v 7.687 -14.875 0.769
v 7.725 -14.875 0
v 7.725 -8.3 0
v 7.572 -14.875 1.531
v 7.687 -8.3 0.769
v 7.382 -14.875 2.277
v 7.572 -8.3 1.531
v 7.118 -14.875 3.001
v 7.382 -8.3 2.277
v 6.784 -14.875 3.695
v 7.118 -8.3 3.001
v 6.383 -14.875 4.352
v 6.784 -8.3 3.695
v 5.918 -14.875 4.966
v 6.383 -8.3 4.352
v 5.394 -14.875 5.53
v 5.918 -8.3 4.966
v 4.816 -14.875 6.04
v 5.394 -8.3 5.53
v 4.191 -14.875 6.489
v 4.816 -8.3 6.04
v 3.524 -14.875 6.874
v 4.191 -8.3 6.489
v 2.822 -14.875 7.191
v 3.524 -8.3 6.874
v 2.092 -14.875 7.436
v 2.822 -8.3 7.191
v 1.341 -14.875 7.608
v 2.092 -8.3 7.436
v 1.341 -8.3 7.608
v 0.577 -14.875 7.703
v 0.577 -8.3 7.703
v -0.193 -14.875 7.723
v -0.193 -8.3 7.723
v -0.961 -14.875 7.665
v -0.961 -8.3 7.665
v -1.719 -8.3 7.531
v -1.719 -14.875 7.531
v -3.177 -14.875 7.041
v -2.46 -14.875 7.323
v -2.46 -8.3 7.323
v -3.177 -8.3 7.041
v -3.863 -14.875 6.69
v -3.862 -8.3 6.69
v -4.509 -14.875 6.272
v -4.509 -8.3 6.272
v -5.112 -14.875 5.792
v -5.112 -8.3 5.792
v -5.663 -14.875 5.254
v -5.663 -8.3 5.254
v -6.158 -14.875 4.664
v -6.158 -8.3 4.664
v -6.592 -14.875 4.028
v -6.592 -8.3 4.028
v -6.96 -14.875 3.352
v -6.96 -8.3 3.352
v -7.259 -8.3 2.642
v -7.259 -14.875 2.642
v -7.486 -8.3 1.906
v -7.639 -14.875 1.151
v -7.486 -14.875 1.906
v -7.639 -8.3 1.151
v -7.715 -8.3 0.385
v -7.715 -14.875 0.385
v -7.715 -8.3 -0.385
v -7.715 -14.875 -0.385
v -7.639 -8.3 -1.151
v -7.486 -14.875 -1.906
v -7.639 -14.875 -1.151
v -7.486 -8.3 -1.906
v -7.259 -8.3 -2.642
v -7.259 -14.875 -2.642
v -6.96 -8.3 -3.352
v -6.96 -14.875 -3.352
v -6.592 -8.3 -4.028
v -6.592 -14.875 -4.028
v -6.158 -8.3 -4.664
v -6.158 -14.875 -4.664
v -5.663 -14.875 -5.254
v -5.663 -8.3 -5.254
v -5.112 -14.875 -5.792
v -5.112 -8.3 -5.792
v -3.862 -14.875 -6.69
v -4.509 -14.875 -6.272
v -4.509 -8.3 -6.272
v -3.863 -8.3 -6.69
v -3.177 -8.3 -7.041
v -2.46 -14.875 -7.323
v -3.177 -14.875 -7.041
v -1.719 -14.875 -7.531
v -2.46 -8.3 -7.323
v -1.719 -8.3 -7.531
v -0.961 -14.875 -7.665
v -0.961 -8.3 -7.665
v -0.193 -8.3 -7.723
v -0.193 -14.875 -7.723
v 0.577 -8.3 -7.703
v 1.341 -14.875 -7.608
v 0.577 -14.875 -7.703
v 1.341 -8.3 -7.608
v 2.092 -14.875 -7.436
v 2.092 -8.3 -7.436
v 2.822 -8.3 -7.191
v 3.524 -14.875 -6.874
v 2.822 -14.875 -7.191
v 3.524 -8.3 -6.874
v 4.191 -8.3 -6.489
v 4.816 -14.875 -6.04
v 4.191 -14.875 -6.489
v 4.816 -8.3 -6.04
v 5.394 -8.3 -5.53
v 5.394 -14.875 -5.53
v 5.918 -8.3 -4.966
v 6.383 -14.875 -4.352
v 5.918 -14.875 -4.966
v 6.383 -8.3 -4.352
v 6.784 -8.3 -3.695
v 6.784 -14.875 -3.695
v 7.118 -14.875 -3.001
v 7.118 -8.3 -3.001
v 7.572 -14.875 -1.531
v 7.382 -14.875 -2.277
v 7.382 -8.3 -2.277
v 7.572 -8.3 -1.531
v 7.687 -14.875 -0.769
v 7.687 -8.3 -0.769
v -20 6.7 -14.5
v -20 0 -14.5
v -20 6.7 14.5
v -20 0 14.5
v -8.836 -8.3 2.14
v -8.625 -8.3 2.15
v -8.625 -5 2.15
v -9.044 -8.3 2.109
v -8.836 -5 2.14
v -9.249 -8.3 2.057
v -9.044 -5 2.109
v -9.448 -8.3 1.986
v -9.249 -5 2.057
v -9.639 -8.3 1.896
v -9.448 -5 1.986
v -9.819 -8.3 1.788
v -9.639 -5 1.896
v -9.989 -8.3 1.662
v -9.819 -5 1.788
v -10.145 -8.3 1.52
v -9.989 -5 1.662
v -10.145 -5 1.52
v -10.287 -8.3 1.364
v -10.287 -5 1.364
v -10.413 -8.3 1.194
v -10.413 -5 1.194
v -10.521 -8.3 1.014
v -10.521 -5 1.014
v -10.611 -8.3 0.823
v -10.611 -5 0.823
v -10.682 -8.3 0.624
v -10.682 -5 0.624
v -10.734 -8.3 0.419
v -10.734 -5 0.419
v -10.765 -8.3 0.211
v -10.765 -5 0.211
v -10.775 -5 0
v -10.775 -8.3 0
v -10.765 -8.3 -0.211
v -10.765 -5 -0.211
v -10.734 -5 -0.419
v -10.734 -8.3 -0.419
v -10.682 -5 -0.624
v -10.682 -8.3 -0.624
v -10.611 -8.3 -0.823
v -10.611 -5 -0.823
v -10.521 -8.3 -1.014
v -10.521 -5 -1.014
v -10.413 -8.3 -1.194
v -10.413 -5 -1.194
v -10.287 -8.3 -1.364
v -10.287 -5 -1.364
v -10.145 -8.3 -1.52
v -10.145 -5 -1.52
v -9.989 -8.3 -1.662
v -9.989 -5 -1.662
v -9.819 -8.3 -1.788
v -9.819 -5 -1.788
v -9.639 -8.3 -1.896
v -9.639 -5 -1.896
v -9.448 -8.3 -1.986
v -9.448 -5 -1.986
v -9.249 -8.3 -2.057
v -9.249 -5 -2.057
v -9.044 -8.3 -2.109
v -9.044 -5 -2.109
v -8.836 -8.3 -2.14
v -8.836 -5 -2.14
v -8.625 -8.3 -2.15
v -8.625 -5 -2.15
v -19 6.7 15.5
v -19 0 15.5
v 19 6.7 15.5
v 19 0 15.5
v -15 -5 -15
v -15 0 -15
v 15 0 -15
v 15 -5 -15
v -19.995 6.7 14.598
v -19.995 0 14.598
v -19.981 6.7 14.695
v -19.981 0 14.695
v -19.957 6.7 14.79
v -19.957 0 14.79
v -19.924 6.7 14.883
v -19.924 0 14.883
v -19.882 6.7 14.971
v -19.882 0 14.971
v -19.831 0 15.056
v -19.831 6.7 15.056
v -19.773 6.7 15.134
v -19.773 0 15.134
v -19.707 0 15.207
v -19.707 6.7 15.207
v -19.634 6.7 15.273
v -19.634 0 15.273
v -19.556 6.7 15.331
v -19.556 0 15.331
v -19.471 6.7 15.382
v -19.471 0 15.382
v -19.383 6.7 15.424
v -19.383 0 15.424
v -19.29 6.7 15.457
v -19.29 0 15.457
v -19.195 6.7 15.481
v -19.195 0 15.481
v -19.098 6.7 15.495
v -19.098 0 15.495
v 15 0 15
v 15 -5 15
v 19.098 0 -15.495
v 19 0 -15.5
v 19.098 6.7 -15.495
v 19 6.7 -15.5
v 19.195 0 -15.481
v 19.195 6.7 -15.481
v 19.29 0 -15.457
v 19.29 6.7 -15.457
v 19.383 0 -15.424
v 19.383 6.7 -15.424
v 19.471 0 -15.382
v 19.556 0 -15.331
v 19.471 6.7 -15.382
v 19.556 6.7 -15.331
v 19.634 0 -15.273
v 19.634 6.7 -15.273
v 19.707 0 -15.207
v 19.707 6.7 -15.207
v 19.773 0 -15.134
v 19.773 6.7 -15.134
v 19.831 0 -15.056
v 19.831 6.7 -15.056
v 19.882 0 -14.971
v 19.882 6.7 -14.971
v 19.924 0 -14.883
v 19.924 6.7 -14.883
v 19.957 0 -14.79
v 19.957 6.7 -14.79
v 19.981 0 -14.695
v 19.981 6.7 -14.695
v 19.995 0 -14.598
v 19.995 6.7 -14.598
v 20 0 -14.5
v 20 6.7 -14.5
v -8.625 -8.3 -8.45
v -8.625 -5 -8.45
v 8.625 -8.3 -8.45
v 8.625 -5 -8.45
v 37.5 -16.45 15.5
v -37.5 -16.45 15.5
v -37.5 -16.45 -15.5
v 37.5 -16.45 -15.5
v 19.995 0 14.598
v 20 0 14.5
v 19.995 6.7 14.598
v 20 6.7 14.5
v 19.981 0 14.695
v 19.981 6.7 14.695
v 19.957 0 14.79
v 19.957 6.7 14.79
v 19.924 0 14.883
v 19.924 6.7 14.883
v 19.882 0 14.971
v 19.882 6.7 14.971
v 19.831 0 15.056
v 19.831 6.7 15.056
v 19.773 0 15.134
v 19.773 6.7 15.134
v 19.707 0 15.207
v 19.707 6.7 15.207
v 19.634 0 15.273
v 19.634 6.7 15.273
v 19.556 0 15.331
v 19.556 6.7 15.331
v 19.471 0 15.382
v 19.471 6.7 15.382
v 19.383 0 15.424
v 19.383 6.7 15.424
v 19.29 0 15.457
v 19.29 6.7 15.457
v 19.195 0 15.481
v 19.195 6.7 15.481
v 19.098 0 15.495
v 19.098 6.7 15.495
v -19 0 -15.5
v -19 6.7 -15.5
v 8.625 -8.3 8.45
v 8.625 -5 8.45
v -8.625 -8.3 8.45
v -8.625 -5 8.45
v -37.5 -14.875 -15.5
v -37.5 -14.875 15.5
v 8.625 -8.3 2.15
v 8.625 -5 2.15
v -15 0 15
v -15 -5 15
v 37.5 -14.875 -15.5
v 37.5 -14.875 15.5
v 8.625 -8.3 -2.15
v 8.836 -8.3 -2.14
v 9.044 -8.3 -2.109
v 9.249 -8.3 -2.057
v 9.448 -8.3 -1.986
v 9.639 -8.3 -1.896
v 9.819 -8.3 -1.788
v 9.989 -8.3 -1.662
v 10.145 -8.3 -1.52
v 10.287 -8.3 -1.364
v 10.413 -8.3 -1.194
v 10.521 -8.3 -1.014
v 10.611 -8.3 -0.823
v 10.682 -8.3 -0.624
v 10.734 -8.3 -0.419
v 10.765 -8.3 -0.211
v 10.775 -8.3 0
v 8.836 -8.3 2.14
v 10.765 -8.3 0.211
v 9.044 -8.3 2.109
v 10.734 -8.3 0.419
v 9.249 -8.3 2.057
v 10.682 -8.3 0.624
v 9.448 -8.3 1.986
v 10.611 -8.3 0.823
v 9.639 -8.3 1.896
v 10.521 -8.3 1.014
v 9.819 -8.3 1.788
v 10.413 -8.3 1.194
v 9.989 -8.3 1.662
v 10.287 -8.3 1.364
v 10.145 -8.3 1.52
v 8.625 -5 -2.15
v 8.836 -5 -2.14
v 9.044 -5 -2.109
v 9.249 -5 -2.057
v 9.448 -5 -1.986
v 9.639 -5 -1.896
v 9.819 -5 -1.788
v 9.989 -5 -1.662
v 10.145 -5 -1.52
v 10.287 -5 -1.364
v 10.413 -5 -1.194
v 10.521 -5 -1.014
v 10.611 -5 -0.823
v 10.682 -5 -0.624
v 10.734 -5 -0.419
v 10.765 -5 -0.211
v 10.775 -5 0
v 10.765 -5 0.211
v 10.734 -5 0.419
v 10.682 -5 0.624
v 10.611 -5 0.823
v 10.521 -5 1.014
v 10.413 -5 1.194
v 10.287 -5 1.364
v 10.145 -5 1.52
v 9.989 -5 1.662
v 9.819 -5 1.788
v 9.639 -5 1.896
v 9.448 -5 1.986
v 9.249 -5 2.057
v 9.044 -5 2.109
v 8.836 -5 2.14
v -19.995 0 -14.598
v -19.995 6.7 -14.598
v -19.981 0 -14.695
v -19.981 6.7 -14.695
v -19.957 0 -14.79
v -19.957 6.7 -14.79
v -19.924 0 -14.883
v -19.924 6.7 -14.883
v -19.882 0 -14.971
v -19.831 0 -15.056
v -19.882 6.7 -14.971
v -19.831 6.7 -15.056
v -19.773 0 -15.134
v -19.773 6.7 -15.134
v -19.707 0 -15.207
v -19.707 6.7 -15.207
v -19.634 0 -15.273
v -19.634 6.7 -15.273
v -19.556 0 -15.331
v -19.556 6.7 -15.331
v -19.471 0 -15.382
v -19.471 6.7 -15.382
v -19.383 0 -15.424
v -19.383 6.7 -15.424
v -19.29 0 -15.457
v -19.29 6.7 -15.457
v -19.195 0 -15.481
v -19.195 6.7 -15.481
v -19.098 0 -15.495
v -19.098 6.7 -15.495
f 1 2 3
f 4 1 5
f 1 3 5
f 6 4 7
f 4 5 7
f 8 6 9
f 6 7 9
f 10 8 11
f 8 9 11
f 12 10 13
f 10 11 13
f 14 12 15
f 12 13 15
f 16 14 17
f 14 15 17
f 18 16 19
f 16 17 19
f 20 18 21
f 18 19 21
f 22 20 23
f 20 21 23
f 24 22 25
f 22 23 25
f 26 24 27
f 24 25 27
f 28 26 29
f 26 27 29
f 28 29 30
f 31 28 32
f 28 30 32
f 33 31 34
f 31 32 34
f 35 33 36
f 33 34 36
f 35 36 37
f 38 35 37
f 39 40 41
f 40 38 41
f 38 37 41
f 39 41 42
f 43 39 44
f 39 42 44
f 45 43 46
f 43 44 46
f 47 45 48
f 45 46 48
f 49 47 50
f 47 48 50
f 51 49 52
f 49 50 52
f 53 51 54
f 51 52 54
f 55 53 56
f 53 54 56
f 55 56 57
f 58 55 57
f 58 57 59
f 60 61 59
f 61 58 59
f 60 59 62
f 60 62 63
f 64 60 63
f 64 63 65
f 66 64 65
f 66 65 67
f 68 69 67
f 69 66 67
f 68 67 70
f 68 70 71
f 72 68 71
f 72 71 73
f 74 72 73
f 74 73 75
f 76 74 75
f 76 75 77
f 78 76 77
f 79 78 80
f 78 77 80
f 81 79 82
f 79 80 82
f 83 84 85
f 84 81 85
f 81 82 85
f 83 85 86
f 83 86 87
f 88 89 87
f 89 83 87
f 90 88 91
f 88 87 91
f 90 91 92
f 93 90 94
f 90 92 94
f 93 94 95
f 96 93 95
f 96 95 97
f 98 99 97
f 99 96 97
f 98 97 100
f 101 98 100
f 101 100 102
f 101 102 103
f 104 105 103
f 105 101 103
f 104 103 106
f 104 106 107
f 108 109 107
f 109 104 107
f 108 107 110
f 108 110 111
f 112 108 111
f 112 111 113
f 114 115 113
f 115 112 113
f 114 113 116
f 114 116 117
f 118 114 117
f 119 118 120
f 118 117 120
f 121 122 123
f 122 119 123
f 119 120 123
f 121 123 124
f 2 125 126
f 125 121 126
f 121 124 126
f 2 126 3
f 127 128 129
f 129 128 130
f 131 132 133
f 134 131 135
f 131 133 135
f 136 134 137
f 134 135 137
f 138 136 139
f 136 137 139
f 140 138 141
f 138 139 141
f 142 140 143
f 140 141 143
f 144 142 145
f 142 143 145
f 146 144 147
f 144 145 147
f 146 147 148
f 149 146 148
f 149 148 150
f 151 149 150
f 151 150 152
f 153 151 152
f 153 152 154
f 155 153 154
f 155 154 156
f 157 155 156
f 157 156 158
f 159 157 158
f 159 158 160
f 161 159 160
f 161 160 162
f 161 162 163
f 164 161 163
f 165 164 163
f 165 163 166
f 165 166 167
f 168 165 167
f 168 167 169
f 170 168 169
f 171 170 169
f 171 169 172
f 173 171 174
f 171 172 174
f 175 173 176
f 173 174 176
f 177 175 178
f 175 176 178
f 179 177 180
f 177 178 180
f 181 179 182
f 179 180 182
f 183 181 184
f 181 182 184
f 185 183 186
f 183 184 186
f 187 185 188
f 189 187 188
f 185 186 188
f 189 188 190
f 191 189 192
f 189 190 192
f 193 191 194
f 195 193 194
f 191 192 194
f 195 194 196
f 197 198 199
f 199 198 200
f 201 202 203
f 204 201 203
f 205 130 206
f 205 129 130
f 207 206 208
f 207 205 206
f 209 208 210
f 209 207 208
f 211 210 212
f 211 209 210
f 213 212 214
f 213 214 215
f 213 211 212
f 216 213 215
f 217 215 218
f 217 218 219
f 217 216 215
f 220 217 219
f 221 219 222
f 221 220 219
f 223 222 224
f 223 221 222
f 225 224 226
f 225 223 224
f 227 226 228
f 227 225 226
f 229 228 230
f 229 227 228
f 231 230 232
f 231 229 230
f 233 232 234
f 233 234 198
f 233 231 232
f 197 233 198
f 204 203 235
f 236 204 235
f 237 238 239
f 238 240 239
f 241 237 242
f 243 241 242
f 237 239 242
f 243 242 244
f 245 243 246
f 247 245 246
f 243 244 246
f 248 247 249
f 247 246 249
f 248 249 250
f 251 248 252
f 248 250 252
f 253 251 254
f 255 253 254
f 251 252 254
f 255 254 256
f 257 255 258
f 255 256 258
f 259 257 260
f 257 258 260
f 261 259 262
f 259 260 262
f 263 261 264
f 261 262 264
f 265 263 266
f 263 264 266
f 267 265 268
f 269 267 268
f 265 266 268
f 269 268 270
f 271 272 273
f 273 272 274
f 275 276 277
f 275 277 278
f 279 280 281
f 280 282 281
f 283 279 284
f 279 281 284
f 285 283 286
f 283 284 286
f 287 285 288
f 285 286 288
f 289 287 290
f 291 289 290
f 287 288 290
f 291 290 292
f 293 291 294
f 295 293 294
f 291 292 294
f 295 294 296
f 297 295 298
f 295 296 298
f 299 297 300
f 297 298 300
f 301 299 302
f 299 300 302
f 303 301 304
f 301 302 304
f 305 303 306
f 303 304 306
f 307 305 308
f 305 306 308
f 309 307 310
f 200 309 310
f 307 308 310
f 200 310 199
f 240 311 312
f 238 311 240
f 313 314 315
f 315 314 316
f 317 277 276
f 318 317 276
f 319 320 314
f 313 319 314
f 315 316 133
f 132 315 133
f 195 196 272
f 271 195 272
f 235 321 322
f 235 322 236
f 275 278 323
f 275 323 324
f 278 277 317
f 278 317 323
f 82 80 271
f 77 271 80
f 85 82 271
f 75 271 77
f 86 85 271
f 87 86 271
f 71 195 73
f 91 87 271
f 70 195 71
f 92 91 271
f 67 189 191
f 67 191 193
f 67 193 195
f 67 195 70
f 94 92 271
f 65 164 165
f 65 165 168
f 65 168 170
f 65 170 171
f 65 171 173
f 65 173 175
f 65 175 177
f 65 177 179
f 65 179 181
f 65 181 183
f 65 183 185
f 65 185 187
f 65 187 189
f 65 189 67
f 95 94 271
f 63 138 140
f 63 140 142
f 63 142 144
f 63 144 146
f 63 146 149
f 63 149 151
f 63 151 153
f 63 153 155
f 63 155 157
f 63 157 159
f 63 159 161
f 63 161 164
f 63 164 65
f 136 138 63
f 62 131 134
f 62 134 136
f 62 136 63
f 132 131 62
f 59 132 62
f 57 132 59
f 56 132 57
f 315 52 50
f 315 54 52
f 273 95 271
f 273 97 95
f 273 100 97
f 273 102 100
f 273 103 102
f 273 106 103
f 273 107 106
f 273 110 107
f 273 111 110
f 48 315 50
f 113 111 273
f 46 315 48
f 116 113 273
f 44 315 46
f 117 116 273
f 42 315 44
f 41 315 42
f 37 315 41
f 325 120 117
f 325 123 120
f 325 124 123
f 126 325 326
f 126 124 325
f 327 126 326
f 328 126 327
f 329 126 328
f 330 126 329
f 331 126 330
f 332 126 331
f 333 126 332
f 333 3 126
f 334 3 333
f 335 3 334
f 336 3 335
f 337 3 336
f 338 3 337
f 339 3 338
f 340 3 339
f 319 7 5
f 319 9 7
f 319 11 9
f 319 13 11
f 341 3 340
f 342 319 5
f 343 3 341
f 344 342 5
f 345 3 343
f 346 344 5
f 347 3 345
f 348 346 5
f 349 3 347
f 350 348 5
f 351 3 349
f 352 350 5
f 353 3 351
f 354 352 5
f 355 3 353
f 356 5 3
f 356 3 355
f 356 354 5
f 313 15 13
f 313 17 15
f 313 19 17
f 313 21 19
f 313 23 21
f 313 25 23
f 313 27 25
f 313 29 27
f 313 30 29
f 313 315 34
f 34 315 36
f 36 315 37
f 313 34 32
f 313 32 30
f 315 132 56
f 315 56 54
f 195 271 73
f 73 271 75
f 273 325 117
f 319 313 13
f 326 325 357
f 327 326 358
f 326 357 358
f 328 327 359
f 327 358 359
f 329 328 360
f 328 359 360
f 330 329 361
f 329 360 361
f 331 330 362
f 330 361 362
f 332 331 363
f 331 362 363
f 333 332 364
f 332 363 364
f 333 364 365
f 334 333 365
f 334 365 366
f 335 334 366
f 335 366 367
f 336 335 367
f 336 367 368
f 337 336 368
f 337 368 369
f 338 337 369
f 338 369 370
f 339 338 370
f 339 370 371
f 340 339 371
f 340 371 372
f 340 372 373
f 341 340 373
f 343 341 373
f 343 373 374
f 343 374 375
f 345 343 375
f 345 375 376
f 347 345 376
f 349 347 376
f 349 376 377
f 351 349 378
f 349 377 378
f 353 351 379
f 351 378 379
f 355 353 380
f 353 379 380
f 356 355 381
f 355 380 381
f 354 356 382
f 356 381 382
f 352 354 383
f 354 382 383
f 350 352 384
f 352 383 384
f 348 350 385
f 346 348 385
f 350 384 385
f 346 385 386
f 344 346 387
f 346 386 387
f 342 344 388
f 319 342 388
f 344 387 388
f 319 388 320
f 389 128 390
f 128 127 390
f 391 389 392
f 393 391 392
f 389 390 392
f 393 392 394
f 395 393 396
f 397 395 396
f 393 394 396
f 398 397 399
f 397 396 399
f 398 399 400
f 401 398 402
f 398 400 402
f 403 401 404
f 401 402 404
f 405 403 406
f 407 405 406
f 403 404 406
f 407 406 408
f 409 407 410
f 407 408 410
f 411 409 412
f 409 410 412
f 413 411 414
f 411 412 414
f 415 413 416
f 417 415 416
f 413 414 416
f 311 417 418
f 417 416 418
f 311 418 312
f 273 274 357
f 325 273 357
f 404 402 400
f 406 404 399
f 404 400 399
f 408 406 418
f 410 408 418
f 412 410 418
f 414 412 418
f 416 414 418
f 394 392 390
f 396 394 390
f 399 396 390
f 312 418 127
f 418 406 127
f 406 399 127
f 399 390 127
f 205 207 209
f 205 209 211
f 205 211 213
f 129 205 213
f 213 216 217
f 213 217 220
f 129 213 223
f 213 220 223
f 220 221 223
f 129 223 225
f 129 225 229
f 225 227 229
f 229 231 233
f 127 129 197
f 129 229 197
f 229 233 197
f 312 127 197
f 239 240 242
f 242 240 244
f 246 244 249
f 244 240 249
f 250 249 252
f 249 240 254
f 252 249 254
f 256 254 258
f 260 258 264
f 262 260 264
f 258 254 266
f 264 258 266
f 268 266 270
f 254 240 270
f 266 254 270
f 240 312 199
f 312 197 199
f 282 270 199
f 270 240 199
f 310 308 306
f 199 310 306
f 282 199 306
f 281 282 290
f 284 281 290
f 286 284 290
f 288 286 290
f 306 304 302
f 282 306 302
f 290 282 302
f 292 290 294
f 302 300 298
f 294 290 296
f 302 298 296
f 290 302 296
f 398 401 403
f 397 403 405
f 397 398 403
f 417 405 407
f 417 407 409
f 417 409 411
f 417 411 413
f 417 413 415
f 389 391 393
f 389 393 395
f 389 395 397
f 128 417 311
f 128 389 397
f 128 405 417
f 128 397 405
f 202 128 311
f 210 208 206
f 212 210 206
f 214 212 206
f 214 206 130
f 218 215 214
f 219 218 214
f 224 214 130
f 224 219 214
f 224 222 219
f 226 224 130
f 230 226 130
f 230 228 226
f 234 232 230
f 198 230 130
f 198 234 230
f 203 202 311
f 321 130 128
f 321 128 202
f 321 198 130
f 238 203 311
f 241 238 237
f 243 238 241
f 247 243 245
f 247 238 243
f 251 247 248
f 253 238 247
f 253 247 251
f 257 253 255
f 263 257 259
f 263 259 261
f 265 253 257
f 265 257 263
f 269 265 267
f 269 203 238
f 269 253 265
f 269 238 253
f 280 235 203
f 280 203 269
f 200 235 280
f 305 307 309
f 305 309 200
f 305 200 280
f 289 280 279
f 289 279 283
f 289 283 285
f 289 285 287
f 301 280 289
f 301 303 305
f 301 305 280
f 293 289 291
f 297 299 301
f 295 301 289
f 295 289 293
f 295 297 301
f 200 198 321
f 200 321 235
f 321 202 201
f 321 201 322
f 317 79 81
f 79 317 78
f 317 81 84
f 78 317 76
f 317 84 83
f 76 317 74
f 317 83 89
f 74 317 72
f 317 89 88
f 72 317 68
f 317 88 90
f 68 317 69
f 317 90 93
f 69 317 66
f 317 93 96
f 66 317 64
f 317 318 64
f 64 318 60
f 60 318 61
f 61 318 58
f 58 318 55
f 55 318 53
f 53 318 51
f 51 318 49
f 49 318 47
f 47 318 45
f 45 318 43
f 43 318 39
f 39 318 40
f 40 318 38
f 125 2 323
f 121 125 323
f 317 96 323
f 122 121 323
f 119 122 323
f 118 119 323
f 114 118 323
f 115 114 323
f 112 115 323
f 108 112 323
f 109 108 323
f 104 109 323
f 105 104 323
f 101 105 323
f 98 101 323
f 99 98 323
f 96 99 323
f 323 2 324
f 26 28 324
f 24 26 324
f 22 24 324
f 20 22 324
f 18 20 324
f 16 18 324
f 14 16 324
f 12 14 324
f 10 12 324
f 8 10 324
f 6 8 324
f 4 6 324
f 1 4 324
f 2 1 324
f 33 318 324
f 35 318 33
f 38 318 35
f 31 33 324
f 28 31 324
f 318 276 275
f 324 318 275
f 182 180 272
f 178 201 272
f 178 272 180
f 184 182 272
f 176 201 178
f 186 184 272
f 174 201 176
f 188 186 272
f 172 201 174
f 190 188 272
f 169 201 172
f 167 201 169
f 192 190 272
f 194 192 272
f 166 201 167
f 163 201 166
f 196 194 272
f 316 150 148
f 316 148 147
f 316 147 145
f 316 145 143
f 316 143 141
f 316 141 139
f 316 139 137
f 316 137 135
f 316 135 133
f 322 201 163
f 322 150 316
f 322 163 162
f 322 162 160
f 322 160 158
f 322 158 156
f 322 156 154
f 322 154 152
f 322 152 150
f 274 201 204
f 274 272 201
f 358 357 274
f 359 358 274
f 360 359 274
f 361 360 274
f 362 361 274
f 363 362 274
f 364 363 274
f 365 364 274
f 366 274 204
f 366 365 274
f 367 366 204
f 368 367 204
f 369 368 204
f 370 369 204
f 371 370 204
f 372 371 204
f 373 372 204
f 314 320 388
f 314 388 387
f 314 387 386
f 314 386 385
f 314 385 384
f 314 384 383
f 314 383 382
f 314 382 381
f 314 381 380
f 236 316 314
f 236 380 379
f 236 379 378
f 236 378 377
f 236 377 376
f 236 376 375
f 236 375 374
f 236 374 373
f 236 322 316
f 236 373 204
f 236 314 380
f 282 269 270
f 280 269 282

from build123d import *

# Parameters (mm, degrees)
F0_W      = 40
F0_H      = 31
F1_DEPTH  = 6.7
F2_R      = 1
F3_W      = 30
F3_H      = 30
F4_DEPTH  = 5
F6_DEPTH  = 8.3
F7_R      = 7.725
F8_DEPTH  = 8.15
F9_W      = 75
F9_H      = 31
F10_DEPTH = 1.5748


with BuildPart() as f1:
    # F0 (on Front) → F1 (new body)
    with BuildSketch(Plane.XZ):
        Rectangle(F0_W, F0_H)
    extrude(amount=-F1_DEPTH)

    # F2
    f2_edges = [f1.edges().sort_by_distance(p)[0] for p in [
        (-20, 3.35, 15.5),
        (-20, 3.35, -15.5),
        (20, 3.35, 15.5),
        (20, 3.35, -15.5),
    ]]
    fillet(f2_edges, radius=F2_R)

    # F3 (on face) → F4 (join)
    with BuildSketch(Plane.XZ):
        Rectangle(F3_W, F3_H)
    extrude(amount=F4_DEPTH)

    # F5 (on face) → F6 (join)
    with BuildSketch(Plane.XZ):
        Polygon((8.625, 2.15), (8.625, 8.45), (-8.625, 8.45), (-8.625, 2.15), (-8.625, -2.15), (-8.625, -8.45), (8.625, -8.45), (8.625, -2.15), align=None)
        with BuildLine():
            ThreePointArc((8.625, -2.15), (10.775, 0), (8.625, 2.15))
            Line((8.625, 2.15), (8.625, -2.15))
        make_face()
        with BuildLine():
            Line((-8.625, -2.15), (-8.625, 2.15))
            ThreePointArc((-8.625, 2.15), (-10.775, 0), (-8.625, -2.15))
        make_face()
    extrude(amount=F6_DEPTH)

    # F7 (on face) → F8 (join)
    with BuildSketch(Plane.XZ.offset(8.3)):
        Circle(F7_R)
    extrude(amount=F8_DEPTH)

    # F9 (on face) → F10 (join)
    with BuildSketch(Plane.XZ.offset(16.45)):
        Rectangle(F9_W, F9_H)
    extrude(amount=-F10_DEPTH)


solid = f1.part
